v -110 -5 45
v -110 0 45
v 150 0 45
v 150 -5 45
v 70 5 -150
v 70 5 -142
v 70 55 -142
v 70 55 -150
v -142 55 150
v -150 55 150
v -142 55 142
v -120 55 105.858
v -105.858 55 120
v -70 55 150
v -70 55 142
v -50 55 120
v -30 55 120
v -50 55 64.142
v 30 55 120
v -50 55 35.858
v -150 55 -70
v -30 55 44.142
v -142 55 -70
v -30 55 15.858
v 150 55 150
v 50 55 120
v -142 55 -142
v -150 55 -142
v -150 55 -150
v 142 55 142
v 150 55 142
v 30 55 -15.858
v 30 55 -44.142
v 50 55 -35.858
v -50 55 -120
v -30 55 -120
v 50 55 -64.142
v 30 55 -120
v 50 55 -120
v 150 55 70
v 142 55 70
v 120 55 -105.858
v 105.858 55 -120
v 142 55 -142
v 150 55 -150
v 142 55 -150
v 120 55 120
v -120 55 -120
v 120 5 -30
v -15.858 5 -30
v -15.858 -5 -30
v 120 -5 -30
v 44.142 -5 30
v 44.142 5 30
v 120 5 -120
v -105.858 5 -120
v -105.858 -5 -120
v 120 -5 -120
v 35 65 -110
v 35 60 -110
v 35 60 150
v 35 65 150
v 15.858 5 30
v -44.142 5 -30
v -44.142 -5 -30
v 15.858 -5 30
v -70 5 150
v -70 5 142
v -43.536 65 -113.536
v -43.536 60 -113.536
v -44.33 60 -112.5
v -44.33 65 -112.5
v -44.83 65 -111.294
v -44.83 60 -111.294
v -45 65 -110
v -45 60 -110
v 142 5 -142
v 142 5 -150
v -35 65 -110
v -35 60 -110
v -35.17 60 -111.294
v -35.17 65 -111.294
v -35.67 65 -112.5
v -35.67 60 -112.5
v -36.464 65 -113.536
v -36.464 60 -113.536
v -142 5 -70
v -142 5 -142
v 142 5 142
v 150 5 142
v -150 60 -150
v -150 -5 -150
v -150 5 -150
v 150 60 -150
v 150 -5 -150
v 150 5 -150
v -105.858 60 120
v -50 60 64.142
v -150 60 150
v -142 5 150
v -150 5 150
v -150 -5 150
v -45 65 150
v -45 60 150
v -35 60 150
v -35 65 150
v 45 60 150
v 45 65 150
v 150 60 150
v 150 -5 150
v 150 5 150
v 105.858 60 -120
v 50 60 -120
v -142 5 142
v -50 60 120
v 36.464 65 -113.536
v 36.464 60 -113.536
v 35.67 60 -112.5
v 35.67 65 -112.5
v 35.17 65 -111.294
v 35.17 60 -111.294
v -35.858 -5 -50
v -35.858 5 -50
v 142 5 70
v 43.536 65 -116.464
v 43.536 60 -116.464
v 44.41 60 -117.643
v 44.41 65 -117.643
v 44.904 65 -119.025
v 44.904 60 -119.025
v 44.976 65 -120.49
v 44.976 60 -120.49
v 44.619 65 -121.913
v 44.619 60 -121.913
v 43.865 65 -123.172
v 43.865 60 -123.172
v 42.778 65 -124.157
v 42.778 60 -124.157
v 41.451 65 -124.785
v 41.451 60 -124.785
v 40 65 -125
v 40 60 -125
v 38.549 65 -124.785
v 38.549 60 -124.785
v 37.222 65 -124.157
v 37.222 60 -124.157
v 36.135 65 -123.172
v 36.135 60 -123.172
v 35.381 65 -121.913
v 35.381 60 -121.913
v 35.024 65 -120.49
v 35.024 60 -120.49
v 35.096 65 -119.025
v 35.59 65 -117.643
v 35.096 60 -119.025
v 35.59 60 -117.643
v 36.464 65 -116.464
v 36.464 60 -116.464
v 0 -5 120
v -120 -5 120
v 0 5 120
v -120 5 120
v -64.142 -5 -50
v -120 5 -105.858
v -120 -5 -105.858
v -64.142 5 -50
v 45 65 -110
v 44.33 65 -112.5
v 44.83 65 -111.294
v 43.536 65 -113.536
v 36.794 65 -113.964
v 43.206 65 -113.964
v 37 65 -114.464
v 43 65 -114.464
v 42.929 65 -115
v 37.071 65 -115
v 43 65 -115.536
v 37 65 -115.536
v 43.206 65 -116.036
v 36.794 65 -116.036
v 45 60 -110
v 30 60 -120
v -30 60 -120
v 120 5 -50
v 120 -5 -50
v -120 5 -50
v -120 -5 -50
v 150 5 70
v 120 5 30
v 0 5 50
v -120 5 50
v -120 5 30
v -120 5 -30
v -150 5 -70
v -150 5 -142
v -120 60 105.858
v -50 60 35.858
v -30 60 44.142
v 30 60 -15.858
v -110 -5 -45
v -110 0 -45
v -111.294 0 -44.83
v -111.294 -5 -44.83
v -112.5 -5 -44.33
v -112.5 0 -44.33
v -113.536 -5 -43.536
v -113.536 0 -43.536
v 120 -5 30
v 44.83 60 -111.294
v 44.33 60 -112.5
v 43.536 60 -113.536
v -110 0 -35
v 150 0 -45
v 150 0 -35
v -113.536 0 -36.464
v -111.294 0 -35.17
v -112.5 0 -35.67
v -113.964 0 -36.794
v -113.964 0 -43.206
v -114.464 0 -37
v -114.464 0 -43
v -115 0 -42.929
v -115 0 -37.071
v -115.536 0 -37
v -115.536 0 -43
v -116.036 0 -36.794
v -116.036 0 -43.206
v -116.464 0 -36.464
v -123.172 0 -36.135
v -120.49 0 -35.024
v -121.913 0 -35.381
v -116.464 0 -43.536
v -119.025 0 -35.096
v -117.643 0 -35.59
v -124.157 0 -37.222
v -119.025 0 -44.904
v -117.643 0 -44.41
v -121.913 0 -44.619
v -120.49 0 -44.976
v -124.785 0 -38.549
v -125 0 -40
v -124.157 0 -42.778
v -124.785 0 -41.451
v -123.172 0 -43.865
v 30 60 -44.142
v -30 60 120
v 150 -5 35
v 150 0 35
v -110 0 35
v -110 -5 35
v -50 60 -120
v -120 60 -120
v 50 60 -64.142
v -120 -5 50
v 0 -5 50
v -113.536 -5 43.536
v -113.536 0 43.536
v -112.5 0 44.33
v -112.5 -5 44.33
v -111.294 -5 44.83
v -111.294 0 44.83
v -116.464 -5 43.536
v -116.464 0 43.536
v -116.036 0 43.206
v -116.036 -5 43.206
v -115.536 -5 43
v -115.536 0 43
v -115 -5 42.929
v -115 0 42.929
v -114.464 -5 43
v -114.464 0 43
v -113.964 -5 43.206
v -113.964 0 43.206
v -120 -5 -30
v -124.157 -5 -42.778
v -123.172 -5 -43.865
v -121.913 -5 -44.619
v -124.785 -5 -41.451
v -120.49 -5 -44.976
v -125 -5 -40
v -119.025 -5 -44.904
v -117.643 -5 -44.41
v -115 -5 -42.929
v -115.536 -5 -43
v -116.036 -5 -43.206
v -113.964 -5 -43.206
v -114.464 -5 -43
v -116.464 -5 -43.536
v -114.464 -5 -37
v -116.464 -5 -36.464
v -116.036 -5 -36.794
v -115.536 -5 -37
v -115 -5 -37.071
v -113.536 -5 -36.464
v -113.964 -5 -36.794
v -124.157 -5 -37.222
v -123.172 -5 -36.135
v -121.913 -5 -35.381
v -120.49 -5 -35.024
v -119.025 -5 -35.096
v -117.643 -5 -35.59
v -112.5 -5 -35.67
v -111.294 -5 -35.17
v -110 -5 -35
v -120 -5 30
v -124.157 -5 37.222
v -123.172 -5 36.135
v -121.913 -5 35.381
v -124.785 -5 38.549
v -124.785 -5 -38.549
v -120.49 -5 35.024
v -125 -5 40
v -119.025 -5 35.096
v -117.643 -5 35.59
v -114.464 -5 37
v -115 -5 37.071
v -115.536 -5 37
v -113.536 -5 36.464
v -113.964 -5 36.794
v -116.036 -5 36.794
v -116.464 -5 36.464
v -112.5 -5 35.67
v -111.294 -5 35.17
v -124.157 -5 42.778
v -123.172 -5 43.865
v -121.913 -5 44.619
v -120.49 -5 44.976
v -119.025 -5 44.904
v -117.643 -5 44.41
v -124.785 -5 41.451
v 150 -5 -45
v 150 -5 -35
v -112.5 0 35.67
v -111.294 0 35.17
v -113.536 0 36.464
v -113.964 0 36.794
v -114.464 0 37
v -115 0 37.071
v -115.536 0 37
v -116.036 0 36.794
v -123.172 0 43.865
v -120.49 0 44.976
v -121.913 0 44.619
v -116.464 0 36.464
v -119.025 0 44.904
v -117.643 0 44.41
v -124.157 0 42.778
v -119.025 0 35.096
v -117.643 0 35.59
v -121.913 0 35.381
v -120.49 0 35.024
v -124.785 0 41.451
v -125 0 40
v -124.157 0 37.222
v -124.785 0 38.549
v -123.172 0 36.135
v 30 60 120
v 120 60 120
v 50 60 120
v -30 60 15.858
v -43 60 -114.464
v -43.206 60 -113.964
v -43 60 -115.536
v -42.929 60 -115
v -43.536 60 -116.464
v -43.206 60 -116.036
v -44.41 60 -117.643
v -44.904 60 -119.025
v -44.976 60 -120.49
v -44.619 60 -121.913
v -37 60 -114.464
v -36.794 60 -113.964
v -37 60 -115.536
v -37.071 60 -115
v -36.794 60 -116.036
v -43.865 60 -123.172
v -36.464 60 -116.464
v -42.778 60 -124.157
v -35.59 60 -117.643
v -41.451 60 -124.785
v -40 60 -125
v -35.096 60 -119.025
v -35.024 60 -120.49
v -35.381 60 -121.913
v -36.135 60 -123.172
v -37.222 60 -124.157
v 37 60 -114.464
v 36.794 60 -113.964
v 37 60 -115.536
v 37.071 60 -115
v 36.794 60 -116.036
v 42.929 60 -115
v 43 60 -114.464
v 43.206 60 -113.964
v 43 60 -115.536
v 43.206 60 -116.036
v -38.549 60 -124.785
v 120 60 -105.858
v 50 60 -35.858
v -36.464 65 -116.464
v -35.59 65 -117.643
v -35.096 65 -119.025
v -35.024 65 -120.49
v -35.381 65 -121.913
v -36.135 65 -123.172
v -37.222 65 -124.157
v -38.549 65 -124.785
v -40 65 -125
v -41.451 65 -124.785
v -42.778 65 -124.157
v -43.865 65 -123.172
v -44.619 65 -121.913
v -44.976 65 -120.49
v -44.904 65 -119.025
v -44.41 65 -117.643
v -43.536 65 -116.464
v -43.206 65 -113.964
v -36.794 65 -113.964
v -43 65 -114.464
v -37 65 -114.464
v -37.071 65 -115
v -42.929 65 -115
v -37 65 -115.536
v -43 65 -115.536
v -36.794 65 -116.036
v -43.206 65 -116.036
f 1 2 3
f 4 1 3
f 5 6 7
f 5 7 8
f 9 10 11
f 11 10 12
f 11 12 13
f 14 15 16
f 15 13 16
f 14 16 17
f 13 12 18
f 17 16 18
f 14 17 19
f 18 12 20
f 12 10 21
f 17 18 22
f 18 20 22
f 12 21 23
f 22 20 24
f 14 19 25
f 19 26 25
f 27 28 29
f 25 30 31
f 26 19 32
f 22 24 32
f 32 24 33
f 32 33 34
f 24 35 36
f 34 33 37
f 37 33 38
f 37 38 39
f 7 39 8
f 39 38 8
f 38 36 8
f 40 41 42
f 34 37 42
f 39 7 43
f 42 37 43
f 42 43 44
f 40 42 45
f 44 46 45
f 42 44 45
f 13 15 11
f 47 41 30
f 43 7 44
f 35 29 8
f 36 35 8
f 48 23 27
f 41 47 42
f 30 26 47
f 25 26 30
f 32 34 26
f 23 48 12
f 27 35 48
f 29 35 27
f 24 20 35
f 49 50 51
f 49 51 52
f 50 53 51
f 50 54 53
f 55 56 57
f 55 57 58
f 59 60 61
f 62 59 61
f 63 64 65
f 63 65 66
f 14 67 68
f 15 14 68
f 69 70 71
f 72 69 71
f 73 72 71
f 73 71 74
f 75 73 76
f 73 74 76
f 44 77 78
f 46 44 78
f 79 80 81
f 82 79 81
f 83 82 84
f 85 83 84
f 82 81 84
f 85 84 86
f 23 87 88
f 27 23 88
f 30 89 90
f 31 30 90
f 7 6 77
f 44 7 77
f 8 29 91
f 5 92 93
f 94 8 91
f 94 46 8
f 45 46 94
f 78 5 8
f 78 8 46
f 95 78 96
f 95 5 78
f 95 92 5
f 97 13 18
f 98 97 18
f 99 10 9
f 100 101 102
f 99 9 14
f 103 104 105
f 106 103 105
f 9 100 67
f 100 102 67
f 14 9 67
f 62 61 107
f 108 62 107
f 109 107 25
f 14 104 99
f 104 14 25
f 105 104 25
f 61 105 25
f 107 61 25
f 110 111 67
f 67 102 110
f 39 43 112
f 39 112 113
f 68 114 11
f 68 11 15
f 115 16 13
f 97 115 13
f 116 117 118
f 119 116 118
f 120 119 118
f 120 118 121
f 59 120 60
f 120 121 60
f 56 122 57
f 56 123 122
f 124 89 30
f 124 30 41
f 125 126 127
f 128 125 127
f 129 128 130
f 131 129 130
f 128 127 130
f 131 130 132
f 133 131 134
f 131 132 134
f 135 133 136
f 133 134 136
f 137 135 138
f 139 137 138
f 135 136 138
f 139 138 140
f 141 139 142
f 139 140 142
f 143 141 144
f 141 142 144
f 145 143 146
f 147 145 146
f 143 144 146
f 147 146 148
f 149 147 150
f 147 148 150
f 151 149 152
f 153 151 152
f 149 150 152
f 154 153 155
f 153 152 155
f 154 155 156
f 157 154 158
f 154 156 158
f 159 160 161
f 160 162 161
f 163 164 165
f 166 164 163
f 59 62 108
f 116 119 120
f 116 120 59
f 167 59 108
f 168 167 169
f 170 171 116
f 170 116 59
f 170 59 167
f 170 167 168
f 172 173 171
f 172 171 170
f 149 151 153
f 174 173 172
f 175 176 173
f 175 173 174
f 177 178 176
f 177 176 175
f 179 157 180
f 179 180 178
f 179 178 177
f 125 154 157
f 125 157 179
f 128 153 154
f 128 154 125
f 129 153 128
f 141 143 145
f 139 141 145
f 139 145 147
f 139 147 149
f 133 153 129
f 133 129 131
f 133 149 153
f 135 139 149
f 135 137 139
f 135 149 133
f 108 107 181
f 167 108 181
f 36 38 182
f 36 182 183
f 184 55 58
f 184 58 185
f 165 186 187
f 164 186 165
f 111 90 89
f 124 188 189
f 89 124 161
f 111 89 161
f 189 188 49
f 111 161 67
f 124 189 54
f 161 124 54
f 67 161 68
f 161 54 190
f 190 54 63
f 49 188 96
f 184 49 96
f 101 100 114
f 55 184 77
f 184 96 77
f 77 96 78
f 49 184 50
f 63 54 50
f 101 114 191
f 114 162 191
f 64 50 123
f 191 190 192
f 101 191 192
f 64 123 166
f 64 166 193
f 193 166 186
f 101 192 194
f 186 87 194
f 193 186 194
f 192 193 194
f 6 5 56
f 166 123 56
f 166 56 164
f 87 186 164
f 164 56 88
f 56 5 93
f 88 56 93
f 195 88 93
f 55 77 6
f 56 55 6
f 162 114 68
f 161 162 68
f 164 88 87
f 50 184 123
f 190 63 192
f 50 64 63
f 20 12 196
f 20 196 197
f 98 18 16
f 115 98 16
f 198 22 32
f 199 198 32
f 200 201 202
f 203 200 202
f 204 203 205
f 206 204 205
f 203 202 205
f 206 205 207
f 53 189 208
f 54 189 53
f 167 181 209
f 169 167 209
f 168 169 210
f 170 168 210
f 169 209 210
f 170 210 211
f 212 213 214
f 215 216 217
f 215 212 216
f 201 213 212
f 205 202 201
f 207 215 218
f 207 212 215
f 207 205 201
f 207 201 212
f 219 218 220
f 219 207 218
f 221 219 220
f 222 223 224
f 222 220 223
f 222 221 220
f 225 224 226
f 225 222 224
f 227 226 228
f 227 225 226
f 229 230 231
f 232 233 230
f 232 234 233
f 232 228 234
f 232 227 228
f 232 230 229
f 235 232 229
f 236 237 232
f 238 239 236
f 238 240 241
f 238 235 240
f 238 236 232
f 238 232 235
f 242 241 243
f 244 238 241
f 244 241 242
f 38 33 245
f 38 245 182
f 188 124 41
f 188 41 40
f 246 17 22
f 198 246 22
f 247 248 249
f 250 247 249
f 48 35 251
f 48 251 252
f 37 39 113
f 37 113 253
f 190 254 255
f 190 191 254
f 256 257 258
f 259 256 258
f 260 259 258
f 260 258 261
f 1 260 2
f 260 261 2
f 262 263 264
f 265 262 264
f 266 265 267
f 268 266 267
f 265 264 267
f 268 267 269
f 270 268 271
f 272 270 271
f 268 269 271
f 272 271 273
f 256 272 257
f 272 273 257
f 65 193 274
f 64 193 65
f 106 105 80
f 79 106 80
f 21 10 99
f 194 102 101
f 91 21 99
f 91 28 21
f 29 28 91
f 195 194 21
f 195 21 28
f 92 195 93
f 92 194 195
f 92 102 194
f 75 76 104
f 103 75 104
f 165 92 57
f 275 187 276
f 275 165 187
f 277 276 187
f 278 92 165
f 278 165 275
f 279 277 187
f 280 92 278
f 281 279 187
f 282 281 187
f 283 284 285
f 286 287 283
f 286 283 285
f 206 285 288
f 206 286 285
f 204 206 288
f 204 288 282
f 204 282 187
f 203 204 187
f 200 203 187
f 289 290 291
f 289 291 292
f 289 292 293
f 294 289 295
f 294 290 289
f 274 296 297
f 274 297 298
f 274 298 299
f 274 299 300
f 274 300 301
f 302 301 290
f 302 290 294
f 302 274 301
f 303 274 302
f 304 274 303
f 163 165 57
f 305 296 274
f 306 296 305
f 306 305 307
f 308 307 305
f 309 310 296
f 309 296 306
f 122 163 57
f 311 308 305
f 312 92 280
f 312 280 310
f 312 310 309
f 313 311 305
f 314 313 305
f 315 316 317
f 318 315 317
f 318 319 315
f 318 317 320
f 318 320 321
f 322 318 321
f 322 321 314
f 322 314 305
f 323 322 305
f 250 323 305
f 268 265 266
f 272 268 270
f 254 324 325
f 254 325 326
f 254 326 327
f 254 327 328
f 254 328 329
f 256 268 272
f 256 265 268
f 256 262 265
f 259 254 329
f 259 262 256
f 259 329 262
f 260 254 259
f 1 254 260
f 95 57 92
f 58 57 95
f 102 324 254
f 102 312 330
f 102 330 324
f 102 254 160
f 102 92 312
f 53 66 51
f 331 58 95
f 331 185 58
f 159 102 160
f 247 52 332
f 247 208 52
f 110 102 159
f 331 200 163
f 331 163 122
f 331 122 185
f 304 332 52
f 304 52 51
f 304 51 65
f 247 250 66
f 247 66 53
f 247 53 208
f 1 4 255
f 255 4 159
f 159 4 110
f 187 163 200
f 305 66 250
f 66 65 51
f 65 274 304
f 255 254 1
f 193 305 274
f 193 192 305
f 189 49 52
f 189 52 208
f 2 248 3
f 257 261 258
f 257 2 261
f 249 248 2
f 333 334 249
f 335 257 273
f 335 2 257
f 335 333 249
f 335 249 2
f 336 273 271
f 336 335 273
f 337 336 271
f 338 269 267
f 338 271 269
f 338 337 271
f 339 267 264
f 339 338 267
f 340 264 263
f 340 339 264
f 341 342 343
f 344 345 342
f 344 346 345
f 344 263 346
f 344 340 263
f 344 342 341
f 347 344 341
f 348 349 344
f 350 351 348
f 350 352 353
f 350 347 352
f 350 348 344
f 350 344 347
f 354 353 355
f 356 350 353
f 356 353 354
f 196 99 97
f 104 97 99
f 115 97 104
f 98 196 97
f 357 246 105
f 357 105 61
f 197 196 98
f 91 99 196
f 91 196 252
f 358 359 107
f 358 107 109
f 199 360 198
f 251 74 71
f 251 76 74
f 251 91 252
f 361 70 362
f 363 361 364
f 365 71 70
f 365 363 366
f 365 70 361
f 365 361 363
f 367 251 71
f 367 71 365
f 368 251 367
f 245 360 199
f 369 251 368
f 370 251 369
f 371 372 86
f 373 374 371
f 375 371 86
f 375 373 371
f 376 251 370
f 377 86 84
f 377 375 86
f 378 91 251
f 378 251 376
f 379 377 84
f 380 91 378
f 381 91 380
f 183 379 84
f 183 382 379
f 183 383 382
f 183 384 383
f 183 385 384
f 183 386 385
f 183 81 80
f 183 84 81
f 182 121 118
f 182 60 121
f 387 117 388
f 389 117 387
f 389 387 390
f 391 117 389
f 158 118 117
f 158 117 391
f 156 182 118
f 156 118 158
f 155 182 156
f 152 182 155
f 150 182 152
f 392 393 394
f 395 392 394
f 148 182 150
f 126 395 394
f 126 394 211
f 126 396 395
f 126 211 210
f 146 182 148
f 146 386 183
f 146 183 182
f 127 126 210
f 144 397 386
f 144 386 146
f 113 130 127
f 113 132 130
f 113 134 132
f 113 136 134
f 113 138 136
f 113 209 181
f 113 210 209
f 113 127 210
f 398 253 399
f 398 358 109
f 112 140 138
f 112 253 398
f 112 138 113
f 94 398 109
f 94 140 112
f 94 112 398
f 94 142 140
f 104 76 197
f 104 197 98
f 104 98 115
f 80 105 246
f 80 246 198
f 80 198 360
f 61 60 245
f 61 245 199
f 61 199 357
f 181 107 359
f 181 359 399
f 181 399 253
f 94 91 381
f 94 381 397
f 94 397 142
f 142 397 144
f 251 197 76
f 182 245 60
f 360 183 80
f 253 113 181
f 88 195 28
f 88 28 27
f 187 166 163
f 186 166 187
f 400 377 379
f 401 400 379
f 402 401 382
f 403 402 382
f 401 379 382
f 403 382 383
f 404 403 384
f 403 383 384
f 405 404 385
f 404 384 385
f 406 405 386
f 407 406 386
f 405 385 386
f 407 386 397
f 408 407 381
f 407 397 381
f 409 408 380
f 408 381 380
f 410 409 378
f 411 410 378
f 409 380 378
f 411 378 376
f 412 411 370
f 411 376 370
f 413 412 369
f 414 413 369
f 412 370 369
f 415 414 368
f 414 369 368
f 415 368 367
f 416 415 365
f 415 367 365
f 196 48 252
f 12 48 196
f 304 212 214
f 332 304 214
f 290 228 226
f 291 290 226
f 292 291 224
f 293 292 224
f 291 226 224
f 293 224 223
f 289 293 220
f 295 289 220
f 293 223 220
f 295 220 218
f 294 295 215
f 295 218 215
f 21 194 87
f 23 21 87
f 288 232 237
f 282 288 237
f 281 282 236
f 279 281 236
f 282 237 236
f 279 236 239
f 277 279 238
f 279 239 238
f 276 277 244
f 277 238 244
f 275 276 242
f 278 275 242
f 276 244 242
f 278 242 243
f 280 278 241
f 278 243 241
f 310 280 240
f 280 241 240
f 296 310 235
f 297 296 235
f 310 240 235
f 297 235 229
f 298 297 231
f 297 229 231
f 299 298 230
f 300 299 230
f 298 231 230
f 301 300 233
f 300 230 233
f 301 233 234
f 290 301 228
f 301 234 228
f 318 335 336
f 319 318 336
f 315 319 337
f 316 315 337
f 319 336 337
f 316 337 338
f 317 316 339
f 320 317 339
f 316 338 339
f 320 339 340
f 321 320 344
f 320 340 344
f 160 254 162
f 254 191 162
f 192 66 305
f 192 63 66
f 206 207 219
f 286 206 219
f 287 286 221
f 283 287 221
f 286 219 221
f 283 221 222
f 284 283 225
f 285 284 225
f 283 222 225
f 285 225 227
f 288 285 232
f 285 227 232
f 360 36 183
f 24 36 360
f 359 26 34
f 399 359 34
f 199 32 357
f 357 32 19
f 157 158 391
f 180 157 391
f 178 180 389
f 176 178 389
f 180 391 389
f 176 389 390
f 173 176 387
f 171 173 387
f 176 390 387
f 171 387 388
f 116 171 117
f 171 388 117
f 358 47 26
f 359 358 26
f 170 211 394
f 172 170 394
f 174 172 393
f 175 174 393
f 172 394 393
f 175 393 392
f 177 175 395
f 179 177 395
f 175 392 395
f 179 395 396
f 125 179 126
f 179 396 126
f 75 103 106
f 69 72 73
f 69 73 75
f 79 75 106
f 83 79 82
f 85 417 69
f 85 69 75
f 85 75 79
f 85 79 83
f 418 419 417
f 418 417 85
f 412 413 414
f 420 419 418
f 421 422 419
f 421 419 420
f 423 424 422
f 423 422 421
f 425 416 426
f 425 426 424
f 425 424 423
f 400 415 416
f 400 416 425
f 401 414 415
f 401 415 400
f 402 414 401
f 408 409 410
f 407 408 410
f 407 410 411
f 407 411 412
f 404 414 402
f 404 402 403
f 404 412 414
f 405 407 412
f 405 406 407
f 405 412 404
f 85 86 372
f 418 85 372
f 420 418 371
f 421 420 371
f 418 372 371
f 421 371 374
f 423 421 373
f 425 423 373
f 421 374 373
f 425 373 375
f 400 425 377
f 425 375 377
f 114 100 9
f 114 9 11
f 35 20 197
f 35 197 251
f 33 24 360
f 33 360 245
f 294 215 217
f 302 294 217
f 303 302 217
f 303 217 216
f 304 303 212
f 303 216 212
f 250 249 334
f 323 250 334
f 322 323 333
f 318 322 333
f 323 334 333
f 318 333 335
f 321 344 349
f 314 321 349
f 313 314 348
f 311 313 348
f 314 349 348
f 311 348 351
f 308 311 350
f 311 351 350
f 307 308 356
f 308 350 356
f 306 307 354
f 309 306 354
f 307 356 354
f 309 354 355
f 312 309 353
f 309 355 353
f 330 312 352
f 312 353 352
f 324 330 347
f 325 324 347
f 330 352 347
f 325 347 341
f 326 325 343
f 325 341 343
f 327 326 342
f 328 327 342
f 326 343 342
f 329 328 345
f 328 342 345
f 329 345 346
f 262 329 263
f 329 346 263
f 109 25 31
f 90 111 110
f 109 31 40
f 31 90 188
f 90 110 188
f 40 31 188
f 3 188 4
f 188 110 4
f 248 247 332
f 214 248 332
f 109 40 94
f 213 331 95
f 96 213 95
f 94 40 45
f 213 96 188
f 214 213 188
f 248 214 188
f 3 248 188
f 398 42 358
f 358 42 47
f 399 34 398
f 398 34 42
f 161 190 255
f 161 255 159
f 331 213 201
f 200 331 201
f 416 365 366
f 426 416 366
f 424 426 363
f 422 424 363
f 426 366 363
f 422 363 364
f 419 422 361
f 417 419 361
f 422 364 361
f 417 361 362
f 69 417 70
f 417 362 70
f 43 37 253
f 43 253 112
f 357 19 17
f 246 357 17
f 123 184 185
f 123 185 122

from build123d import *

# Parameters (mm, degrees)
SKETCH_1_W      = 120
SKETCH_1_H      = 70
EXTRUDE_1_DEPTH = 5
SKETCH_2_W      = 120
SKETCH_2_H      = 70
EXTRUDE_2_DEPTH = 5
SKETCH_3_W      = 8
SKETCH_3_H      = 72
SKETCH_3_W_2    = 72
SKETCH_3_H_2    = 8
EXTRUDE_3_DEPTH = 50
SKETCH_4_W      = 300
SKETCH_4_H      = 300
EXTRUDE_4_DEPTH = 5
EXTRUDE_5_DEPTH = 5


with BuildPart() as part:
    # 草图1 → 凸台-拉伸1 (new body)
    with BuildSketch(Plane(origin=(0, 0, 0), x_dir=(1, 0, 0), z_dir=(0, 1, 0))):
        Polygon((-150, 150), (150, 150), (150, -30), (150, -150), (0, -150), (-150, -150), align=None)
        Polygon((-15.857864376, 30), (120, 30), (120, -30), (44.142135624, -30), align=None, mode=Mode.SUBTRACT)
        Polygon((-105.857864376, 120), (120, 120), (120, 50), (-35.857864376, 50), align=None, mode=Mode.SUBTRACT)
        Polygon((-120, 105.857864376), (-120, 50), (-64.142135624, 50), align=None, mode=Mode.SUBTRACT)
        with Locations((-60, -85)):
            Rectangle(SKETCH_1_W, SKETCH_1_H, mode=Mode.SUBTRACT)
        Polygon((-120, 30), (-44.142135624, 30), (15.857864376, -30), (-120, -30), align=None, mode=Mode.SUBTRACT)
    extrude(amount=EXTRUDE_1_DEPTH)

    # 草图2 → 凸台-拉伸2 (add)
    with BuildSketch(Plane.XZ):
        with BuildLine():
            Line((150, 45), (150, 150))
            Line((150, 150), (-150, 150))
            Line((-150, 150), (-150, -150))
            Line((-150, -150), (150, -150))
            Line((150, -150), (150, -45))
            Line((150, -45), (-110, -45))
            ThreePointArc((-110, -45), (-111.913417162, -44.619397663), (-113.535533906, -43.535533906))
            ThreePointArc((-113.535533906, -43.535533906), (-115, -42.928932188), (-116.464466094, -43.535533906))
            ThreePointArc((-116.464466094, -43.535533906), (-125, -40), (-116.464466094, -36.464466094))
            ThreePointArc((-116.464466094, -36.464466094), (-115, -37.071067812), (-113.535533906, -36.464466094))
            ThreePointArc((-113.535533906, -36.464466094), (-111.913417162, -35.380602337), (-110, -35))
            Line((-110, -35), (150, -35))
            Line((150, -35), (150, 35))
            Line((150, 35), (-110, 35))
            ThreePointArc((-110, 35), (-111.913417162, 35.380602337), (-113.535533906, 36.464466094))
            ThreePointArc((-113.535533906, 36.464466094), (-115, 37.071067812), (-116.464466094, 36.464466094))
            ThreePointArc((-116.464466094, 36.464466094), (-125, 40), (-116.464466094, 43.535533906))
            ThreePointArc((-116.464466094, 43.535533906), (-115, 42.928932188), (-113.535533906, 43.535533906))
            ThreePointArc((-113.535533906, 43.535533906), (-111.913417162, 44.619397663), (-110, 45))
            Line((-110, 45), (150, 45))
        make_face()
        with Locations((-60, 85)):
            Rectangle(SKETCH_2_W, SKETCH_2_H, mode=Mode.SUBTRACT)
        Polygon((-120, 30), (-120, -30), (-44.142135624, -30), (15.857864376, 30), align=None, mode=Mode.SUBTRACT)
        Polygon((44.142135624, 30), (-15.857864376, -30), (120, -30), (120, 30), align=None, mode=Mode.SUBTRACT)
        Polygon((-120, -50), (-120, -105.857864376), (-64.142135624, -50), align=None, mode=Mode.SUBTRACT)
        Polygon((-35.857864376, -50), (-105.857864376, -120), (120, -120), (120, -50), align=None, mode=Mode.SUBTRACT)
    extrude(amount=EXTRUDE_2_DEPTH)

    # 草图3 → 凸台-拉伸3 (add)
    with BuildSketch(Plane(origin=(0, 5, 0), x_dir=(1, 0, 0), z_dir=(0, 1, 0))):
        with Locations((146, -106)):
            Rectangle(SKETCH_3_W, SKETCH_3_H)
        with Locations((-106, -146)):
            Rectangle(SKETCH_3_W_2, SKETCH_3_H_2)
        with Locations((-146, 106)):
            Rectangle(SKETCH_3_W, SKETCH_3_H)
        with Locations((106, 146)):
            Rectangle(SKETCH_3_W_2, SKETCH_3_H_2)
    extrude(amount=EXTRUDE_3_DEPTH)

    # 草图4 → 凸台-拉伸4 (add)
    with BuildSketch(Plane(origin=(0, 55, 0), x_dir=(1, 0, 0), z_dir=(0, 1, 0))):
        Rectangle(SKETCH_4_W, SKETCH_4_H)
        Polygon((30, 120), (-30, 120), (-30, -15.857864376), (30, 44.142135624), align=None, mode=Mode.SUBTRACT)
        Polygon((105.857864376, 120), (50, 120), (50, 64.142135624), align=None, mode=Mode.SUBTRACT)
        Polygon((120, 105.857864376), (120, -120), (50, -120), (50, 35.857864376), align=None, mode=Mode.SUBTRACT)
        Polygon((-120, 120), (-120, -105.857864376), (-50, -35.857864376), (-50, 120), align=None, mode=Mode.SUBTRACT)
        Polygon((-50, -120), (-105.857864376, -120), (-50, -64.142135624), align=None, mode=Mode.SUBTRACT)
        Polygon((30, -120), (-30, -120), (-30, -44.142135624), (30, 15.857864376), align=None, mode=Mode.SUBTRACT)
    extrude(amount=EXTRUDE_4_DEPTH)

    # 草图5 → 凸台-拉伸5 (add)
    with BuildSketch(Plane(origin=(0, 60, 0), x_dir=(1, 0, 0), z_dir=(0, 1, 0))):
        with BuildLine():
            Line((35, 110), (35, -150))
            Line((35, -150), (45, -150))
            Line((45, -150), (45, 110))
            ThreePointArc((45, 110), (44.619397663, 111.913417162), (43.535533906, 113.535533906))
            ThreePointArc((43.535533906, 113.535533906), (42.928932188, 115), (43.535533906, 116.464466094))
            ThreePointArc((43.535533906, 116.464466094), (40, 125), (36.464466094, 116.464466094))
            ThreePointArc((36.464466094, 116.464466094), (37.071067812, 115), (36.464466094, 113.535533906))
            ThreePointArc((36.464466094, 113.535533906), (35.380602337, 111.913417162), (35, 110))
        make_face()
        with BuildLine():
            Line((-45, -150), (-35, -150))
            Line((-35, -150), (-35, 110))
            ThreePointArc((-35, 110), (-35.380602337, 111.913417162), (-36.464466094, 113.535533906))
            ThreePointArc((-36.464466094, 113.535533906), (-37.071067812, 115), (-36.464466094, 116.464466094))
            ThreePointArc((-36.464466094, 116.464466094), (-40, 125), (-43.535533906, 116.464466094))
            ThreePointArc((-43.535533906, 116.464466094), (-42.928932188, 115), (-43.535533906, 113.535533906))
            ThreePointArc((-43.535533906, 113.535533906), (-44.619397663, 111.913417162), (-45, 110))
            Line((-45, 110), (-45, -150))
        make_face()
    extrude(amount=EXTRUDE_5_DEPTH)


solid = part.part
